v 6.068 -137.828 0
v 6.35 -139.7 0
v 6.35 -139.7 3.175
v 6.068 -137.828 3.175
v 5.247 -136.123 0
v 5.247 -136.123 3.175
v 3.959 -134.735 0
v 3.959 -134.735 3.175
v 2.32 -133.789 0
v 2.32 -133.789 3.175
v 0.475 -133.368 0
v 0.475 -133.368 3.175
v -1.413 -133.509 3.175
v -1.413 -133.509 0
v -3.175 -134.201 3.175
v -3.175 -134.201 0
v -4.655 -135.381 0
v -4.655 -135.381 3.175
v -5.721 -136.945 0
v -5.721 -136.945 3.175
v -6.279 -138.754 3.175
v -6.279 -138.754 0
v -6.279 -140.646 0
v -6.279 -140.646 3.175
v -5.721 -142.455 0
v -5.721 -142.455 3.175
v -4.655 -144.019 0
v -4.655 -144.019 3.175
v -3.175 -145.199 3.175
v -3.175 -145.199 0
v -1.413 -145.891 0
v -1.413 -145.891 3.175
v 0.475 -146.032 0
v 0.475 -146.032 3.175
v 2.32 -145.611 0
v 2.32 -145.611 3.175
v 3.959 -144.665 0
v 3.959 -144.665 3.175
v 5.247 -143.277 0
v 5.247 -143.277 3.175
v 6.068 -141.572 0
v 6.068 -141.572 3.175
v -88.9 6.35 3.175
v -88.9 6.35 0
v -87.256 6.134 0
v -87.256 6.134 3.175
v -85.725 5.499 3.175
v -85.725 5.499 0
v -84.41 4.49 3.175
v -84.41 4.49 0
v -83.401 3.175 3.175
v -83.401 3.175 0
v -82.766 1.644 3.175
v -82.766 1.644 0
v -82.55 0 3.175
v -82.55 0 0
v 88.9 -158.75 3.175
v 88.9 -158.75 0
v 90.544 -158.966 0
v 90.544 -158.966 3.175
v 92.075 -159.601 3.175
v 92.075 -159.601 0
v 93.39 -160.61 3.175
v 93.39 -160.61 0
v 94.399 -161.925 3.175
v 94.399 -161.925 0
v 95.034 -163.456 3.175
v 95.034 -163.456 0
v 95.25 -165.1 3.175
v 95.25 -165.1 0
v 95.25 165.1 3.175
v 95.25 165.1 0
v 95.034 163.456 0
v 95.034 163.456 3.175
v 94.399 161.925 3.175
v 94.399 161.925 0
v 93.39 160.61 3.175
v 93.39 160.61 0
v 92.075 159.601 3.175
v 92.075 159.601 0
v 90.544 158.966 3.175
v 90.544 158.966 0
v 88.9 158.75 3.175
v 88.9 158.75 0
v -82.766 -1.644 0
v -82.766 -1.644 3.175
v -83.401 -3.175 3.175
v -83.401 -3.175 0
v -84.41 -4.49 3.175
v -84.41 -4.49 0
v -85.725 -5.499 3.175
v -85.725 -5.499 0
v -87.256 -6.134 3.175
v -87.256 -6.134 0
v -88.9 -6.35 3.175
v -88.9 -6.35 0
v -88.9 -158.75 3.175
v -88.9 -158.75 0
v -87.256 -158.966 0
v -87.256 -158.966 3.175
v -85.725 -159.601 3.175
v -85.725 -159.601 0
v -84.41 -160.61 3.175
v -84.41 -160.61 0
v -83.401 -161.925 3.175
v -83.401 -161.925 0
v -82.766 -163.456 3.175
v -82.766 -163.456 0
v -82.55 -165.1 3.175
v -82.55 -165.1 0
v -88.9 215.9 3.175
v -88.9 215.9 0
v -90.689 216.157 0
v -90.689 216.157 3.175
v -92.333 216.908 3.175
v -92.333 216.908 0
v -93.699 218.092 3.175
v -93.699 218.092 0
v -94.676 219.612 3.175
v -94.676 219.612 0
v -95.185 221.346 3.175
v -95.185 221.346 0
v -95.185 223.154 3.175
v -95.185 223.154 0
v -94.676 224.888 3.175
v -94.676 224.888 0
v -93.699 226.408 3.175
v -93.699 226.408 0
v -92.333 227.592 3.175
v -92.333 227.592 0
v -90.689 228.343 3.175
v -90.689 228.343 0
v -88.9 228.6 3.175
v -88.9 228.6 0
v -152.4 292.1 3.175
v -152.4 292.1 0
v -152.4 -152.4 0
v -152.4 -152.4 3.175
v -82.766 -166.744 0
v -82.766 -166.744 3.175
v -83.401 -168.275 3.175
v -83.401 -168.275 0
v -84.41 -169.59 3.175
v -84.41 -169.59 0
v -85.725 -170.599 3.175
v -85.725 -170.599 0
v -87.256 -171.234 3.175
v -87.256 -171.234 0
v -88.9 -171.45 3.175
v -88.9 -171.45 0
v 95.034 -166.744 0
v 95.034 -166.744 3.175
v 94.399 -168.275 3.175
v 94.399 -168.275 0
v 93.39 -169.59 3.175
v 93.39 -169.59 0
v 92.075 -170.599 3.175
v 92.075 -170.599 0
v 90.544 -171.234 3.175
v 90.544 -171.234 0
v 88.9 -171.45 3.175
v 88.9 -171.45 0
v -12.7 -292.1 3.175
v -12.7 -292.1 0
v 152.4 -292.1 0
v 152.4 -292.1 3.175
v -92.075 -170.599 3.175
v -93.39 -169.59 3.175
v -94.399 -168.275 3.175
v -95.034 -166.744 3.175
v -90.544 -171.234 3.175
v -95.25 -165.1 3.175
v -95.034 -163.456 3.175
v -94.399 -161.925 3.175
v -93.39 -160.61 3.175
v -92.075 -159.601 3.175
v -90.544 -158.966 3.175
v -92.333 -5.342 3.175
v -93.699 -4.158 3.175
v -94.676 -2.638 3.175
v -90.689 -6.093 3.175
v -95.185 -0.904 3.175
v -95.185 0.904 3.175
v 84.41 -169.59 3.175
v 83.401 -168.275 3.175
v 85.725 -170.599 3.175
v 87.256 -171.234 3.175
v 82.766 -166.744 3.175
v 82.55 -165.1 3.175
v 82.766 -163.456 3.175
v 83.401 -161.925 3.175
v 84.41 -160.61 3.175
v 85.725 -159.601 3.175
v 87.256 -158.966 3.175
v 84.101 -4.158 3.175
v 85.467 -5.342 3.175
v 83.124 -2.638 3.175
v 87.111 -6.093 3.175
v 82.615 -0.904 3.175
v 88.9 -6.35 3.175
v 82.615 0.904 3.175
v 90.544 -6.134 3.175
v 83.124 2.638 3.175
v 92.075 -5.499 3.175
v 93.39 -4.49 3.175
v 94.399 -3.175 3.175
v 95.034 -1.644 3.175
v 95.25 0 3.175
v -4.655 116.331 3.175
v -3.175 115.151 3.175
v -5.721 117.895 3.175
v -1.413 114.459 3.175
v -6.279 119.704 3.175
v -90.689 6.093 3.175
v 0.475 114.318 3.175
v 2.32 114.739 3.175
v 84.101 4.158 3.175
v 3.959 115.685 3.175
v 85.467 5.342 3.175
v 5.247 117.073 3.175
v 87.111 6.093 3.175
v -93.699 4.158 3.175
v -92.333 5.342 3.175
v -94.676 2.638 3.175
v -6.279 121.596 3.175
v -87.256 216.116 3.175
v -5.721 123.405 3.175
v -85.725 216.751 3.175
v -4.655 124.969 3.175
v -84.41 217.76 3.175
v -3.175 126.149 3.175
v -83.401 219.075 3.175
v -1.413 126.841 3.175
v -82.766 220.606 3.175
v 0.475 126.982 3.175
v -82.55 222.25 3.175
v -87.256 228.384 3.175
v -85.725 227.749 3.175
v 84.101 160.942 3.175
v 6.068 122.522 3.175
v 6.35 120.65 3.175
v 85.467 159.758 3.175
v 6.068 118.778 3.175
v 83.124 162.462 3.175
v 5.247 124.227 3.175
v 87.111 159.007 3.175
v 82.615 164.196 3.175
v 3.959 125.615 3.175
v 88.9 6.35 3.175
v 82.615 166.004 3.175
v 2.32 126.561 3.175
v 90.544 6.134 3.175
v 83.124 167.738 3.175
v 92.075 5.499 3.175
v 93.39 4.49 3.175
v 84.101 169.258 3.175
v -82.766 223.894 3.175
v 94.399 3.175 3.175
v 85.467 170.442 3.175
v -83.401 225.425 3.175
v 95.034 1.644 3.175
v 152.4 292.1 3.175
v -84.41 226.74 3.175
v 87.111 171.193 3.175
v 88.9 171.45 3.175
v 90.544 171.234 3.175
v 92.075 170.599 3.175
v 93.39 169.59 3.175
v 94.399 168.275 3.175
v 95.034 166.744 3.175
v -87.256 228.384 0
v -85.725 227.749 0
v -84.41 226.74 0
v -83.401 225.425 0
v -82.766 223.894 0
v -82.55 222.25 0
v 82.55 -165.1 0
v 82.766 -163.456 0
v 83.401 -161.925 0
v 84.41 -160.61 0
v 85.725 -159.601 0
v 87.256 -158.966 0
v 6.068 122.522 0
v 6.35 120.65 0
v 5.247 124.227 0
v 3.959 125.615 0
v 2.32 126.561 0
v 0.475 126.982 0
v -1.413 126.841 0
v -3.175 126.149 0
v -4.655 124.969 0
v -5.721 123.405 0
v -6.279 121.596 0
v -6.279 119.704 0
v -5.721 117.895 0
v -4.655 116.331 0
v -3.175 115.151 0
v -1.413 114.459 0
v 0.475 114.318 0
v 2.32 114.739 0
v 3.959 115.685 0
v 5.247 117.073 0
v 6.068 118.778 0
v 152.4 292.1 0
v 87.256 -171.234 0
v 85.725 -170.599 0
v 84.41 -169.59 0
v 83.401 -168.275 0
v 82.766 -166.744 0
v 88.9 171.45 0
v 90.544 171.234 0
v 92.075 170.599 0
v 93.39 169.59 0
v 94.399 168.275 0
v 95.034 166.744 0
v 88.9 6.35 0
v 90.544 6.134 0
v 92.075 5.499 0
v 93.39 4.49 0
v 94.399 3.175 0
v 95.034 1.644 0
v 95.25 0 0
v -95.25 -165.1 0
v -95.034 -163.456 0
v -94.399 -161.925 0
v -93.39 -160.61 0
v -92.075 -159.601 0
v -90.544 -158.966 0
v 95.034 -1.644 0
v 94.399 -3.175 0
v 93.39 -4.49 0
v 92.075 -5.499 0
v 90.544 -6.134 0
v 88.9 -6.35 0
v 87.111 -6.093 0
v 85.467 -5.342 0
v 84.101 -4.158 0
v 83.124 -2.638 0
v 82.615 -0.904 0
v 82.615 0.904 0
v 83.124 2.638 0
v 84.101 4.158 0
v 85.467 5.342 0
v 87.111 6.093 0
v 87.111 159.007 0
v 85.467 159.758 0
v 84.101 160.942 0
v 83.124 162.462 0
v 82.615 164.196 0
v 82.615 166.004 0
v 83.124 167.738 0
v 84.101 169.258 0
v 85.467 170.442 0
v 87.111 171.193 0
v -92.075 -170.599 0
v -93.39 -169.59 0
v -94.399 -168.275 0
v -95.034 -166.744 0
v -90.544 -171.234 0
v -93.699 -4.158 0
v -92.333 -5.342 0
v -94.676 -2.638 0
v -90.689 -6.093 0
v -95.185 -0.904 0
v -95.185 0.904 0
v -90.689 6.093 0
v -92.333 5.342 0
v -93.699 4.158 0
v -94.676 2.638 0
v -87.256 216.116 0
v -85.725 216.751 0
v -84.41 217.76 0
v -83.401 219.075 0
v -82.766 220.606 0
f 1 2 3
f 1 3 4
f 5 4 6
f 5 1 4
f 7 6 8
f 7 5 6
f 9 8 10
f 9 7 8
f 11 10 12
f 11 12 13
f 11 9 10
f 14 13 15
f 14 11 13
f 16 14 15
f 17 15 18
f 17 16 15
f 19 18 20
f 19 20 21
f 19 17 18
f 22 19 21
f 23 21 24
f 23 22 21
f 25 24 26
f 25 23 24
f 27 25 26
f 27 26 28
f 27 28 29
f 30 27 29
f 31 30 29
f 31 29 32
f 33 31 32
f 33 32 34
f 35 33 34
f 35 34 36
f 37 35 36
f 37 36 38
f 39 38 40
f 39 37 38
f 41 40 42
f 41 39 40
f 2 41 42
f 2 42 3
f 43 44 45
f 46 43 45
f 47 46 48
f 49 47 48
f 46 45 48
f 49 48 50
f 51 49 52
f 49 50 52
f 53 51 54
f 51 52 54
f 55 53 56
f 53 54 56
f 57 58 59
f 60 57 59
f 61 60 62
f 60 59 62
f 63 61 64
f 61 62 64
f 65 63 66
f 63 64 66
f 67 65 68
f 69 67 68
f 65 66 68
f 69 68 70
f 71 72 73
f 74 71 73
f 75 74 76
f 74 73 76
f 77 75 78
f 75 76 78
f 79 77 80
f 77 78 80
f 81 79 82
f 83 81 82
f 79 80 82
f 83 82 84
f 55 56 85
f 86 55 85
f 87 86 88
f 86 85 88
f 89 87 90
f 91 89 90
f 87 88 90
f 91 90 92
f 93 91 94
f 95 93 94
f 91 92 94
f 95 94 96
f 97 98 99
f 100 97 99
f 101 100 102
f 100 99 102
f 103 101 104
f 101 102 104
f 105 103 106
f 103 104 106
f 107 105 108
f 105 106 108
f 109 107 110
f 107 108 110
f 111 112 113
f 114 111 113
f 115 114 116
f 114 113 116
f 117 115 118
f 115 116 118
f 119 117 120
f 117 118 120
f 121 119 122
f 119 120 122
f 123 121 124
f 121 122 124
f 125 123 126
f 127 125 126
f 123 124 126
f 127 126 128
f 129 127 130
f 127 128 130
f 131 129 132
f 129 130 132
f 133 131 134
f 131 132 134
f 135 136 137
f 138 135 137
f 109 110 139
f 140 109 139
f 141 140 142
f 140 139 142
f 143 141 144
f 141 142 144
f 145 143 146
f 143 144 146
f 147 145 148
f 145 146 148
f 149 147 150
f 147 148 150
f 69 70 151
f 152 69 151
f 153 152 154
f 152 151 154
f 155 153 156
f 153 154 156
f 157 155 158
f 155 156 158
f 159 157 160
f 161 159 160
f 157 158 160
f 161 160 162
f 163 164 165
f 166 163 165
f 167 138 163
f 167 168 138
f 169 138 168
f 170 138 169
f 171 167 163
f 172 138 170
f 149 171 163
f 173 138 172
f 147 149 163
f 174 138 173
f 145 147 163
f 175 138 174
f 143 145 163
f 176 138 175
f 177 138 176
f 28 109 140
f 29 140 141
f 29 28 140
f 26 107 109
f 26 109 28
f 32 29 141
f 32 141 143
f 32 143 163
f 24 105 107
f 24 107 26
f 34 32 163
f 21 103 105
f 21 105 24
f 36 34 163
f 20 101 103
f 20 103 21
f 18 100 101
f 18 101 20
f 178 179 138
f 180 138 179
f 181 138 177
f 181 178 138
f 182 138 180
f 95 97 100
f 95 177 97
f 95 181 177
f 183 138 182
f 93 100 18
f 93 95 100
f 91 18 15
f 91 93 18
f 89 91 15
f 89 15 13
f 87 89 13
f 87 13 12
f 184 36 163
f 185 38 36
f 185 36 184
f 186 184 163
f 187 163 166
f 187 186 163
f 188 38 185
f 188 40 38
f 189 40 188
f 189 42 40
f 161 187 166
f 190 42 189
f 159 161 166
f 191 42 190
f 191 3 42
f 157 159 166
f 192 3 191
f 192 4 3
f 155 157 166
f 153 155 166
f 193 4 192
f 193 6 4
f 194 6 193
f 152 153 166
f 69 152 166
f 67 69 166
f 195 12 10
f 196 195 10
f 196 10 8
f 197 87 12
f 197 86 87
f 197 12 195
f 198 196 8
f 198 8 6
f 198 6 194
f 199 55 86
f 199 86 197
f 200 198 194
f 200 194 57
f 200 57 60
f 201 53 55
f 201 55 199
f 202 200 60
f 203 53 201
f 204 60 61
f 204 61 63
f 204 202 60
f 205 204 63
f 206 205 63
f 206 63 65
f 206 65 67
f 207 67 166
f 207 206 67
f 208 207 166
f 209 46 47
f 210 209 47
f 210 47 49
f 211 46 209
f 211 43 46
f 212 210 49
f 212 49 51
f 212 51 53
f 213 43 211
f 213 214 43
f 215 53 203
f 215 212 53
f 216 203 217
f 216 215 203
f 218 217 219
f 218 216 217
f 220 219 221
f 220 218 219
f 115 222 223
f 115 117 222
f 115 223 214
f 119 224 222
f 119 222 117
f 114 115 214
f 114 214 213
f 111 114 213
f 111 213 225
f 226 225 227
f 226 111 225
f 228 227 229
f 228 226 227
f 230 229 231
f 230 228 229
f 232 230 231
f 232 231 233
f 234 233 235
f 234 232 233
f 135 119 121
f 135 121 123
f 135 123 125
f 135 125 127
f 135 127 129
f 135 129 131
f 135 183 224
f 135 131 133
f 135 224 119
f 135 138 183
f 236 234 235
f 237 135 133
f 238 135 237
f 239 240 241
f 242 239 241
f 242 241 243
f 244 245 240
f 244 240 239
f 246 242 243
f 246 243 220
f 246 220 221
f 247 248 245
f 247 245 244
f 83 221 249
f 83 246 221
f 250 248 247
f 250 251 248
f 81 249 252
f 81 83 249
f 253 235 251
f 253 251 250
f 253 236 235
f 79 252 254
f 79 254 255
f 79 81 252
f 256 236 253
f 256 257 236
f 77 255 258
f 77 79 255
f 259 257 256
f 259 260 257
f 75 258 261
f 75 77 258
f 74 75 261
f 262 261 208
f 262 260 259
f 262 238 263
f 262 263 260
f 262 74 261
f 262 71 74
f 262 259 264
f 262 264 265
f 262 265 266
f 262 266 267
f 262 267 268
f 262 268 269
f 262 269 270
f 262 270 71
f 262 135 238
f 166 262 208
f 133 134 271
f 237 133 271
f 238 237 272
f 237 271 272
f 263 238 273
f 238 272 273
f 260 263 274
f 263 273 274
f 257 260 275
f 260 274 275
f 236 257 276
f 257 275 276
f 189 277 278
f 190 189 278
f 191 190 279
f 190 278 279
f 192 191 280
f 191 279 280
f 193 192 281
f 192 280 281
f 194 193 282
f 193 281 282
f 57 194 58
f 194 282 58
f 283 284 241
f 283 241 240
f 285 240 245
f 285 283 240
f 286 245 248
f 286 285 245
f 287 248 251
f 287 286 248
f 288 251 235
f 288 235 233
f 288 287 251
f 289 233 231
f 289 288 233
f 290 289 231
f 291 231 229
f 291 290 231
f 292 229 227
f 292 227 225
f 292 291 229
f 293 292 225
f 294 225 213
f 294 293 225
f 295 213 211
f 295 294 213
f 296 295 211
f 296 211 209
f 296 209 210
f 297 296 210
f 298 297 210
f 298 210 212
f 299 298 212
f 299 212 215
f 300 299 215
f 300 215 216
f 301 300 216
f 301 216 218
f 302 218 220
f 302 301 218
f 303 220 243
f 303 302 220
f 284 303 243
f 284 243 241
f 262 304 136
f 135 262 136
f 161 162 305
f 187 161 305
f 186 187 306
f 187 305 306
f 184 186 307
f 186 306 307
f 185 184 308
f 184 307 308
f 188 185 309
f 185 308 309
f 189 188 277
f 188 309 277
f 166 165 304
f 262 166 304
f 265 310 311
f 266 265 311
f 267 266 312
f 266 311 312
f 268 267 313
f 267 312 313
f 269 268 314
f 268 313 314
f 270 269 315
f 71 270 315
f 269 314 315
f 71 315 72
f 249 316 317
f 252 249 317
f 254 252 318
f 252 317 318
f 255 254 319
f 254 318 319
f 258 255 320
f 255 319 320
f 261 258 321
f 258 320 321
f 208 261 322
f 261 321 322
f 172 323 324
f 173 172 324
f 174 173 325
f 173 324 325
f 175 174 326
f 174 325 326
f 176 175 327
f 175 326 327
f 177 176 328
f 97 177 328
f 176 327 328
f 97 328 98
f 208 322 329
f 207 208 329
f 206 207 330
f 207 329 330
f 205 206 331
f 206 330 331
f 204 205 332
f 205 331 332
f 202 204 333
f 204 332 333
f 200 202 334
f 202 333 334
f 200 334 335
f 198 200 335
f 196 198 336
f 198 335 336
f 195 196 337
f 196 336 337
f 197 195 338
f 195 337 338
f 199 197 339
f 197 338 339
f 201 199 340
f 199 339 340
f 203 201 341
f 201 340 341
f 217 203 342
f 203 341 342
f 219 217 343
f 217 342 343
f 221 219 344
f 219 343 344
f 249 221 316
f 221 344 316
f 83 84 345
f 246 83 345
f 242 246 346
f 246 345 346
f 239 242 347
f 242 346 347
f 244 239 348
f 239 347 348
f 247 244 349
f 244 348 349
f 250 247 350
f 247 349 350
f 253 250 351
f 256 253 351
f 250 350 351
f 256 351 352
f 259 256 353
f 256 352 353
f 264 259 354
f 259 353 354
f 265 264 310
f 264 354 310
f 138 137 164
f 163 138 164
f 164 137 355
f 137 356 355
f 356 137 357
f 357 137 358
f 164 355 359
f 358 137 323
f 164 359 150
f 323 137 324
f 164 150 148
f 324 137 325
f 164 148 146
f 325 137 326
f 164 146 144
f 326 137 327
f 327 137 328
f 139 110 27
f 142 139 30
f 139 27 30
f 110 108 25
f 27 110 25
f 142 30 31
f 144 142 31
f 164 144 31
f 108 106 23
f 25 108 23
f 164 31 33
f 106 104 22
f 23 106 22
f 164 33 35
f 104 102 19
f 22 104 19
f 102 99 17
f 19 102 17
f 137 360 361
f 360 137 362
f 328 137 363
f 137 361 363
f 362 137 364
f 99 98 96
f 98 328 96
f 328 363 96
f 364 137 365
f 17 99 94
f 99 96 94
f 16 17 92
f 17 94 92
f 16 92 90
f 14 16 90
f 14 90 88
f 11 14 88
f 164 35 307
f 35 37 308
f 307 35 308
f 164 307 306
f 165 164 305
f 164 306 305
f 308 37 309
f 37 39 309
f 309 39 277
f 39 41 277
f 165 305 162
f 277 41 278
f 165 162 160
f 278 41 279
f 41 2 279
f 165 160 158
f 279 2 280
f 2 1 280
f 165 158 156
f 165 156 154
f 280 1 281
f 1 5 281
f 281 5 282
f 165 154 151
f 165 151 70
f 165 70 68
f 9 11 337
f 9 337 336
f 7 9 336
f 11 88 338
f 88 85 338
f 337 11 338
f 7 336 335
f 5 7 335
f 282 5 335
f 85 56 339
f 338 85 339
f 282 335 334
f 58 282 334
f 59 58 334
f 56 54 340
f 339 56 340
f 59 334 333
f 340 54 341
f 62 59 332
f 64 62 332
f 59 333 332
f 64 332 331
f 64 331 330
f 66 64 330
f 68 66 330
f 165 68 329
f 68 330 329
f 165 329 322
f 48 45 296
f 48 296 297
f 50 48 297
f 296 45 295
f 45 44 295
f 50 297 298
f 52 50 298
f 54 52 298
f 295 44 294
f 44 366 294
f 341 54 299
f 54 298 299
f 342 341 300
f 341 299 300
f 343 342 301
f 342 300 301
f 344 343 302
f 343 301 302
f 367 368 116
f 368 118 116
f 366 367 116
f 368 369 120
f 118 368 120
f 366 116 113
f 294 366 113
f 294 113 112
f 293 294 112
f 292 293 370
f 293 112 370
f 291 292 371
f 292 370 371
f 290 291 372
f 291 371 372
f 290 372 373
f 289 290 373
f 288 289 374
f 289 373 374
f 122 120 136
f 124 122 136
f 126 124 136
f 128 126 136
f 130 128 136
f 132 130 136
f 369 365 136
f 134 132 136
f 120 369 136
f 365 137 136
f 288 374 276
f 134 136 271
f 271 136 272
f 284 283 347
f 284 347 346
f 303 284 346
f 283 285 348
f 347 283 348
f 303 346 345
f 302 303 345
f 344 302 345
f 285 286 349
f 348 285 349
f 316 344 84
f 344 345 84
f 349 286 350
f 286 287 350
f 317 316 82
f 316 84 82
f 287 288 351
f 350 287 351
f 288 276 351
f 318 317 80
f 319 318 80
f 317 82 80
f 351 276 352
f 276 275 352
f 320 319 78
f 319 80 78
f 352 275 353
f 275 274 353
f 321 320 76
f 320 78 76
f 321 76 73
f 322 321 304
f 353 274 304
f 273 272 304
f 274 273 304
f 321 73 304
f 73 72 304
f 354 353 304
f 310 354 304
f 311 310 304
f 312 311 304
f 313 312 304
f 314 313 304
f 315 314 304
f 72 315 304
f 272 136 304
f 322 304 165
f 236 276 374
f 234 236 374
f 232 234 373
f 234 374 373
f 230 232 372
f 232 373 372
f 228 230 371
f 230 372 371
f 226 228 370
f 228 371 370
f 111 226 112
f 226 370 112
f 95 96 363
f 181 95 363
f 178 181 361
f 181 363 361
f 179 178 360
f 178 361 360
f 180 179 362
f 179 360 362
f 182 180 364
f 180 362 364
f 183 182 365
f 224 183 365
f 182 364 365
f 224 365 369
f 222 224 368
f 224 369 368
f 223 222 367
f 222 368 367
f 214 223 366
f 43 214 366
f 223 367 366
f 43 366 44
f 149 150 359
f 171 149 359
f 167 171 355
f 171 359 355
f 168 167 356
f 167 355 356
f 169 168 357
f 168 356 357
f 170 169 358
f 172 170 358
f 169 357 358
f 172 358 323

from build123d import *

# Parameters (mm, degrees)
F0_R     = 6.35
F1_DEPTH = 3.175


with BuildPart() as f1:
    # F0 (on Top) → F1 (new body)
    with BuildSketch(Plane.XY):
        Polygon((152.4, -152.4), (152.4, 292.1), (88.9, 292.1), (-88.9, 292.1), (-152.4, 292.1), (-152.4, -152.4), (-88.9, -215.9), (-12.7, -292.1), (12.7, -292.1), (152.4, -292.1), align=None)
        with BuildLine():
            ThreePointArc((-82.55, -165.1), (-84.409872, -169.590128), (-88.9, -171.45))
            ThreePointArc((-88.9, -171.45), (-93.390128, -169.590128), (-95.25, -165.1))
            ThreePointArc((-95.25, -165.1), (-93.390128, -160.609872), (-88.9, -158.75))
            ThreePointArc((-88.9, -158.75), (-84.409872, -160.609872), (-82.55, -165.1))
        make_face(mode=Mode.SUBTRACT)
        with BuildLine():
            ThreePointArc((88.9, -158.75), (93.390128, -160.609872), (95.25, -165.1))
            ThreePointArc((95.25, -165.1), (93.390128, -169.590128), (88.9, -171.45))
            ThreePointArc((88.9, -171.45), (84.409872, -169.590128), (82.55, -165.1))
            ThreePointArc((82.55, -165.1), (84.409872, -160.609872), (88.9, -158.75))
        make_face(mode=Mode.SUBTRACT)
        with Locations((0, -139.7)):
            Circle(F0_R, mode=Mode.SUBTRACT)
        with BuildLine():
            ThreePointArc((-88.9, 6.35), (-84.409872, 4.490128), (-82.55, 0))
            ThreePointArc((-82.55, 0), (-84.409872, -4.490128), (-88.9, -6.35))
            ThreePointArc((-88.9, -6.35), (-95.25, 0), (-88.9, 6.35))
        make_face(mode=Mode.SUBTRACT)
        with BuildLine():
            ThreePointArc((-88.9, 215.9), (-95.25, 222.25), (-88.9, 228.6))
            ThreePointArc((-88.9, 228.6), (-84.409872, 226.740128), (-82.55, 222.25))
            ThreePointArc((-82.55, 222.25), (-84.409872, 217.759872), (-88.9, 215.9))
        make_face(mode=Mode.SUBTRACT)
        with Locations((0, 120.65)):
            Circle(F0_R, mode=Mode.SUBTRACT)
        with BuildLine():
            ThreePointArc((88.9, 6.35), (93.390128, 4.490128), (95.25, 0))
            ThreePointArc((95.25, 0), (93.390128, -4.490128), (88.9, -6.35))
            ThreePointArc((88.9, -6.35), (82.55, 0), (88.9, 6.35))
        make_face(mode=Mode.SUBTRACT)
        with BuildLine():
            ThreePointArc((88.9, 158.75), (82.55, 165.1), (88.9, 171.45))
            ThreePointArc((88.9, 171.45), (93.390128, 169.590128), (95.25, 165.1))
            ThreePointArc((95.25, 165.1), (93.390128, 160.609872), (88.9, 158.75))
        make_face(mode=Mode.SUBTRACT)
    extrude(amount=F1_DEPTH)


solid = f1.part
